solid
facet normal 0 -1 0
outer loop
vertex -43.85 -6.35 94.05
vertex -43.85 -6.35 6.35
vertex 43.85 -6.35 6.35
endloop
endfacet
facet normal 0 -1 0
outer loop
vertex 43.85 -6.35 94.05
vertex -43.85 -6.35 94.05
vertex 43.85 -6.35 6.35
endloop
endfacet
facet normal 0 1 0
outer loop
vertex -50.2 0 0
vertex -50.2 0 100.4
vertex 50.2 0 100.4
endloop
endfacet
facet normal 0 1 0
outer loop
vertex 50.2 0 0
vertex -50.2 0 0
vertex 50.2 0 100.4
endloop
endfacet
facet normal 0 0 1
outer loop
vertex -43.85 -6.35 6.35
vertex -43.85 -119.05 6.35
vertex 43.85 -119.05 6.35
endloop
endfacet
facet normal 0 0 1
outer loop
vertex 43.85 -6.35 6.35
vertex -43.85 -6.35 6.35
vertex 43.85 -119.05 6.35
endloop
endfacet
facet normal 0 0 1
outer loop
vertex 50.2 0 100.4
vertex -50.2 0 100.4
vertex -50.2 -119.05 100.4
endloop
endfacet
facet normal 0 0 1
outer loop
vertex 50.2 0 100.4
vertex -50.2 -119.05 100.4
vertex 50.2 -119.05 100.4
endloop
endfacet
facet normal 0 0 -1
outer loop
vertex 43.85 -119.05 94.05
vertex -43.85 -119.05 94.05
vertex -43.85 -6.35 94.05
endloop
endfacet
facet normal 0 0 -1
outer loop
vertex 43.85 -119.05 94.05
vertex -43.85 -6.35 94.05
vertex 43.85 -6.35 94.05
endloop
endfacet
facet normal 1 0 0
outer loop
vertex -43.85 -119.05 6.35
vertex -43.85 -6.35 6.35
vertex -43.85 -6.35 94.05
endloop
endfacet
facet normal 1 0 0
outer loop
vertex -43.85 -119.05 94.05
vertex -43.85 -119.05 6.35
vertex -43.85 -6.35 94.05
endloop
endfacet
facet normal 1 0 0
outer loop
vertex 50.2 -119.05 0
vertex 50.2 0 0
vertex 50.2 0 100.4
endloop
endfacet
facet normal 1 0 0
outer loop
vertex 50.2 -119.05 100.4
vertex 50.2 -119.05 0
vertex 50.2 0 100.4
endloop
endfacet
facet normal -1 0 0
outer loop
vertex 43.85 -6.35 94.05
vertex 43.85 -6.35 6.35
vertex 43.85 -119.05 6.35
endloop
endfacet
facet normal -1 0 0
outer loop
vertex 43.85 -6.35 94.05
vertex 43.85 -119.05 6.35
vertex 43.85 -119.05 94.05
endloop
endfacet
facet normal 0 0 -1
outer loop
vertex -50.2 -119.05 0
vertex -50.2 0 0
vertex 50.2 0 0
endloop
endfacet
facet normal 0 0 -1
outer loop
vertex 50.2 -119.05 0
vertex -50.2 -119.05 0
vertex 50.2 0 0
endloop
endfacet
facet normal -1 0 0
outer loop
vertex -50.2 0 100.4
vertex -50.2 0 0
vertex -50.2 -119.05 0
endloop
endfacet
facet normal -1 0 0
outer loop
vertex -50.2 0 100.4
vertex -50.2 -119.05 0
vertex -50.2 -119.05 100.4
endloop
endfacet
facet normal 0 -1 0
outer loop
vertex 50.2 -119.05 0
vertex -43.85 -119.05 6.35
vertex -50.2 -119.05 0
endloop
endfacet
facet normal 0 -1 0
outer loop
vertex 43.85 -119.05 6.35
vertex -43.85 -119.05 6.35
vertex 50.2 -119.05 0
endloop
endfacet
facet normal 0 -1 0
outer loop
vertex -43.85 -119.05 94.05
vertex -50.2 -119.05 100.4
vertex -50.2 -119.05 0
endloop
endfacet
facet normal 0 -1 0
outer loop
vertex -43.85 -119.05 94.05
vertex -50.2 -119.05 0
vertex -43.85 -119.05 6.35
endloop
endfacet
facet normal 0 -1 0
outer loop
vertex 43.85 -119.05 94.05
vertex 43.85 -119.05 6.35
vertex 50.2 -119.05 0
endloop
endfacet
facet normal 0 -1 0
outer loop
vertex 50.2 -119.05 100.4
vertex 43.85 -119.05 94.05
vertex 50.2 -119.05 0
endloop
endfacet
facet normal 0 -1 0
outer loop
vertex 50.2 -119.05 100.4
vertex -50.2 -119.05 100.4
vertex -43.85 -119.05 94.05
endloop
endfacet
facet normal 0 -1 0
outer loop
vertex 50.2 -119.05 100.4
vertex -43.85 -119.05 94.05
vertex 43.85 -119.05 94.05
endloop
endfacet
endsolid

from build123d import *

# Parameters (mm, degrees)
F0_W     = 100.4
F0_H     = 100.4
F0_W_2   = 87.7
F0_H_2   = 87.7
F1_DEPTH = 6.35
F2_DEPTH = 119.05


with BuildPart() as f1:
    # F0 (on Front) → F1 (new body)
    with BuildSketch(Plane.XZ):
        with Locations((0, 50.2)):
            Rectangle(F0_W, F0_H)
        with Locations((0, 50.2)):
            Rectangle(F0_W_2, F0_H_2, mode=Mode.SUBTRACT)
        with Locations((0, 50.2)):
            Rectangle(F0_W_2, F0_H_2)
    extrude(amount=F1_DEPTH)

    # F0 (on Front) → F2 (join)
    with BuildSketch(Plane.XZ):
        with Locations((0, 50.2)):
            Rectangle(F0_W, F0_H)
        with Locations((0, 50.2)):
            Rectangle(F0_W_2, F0_H_2, mode=Mode.SUBTRACT)
    extrude(amount=F2_DEPTH)


solid = f1.part
